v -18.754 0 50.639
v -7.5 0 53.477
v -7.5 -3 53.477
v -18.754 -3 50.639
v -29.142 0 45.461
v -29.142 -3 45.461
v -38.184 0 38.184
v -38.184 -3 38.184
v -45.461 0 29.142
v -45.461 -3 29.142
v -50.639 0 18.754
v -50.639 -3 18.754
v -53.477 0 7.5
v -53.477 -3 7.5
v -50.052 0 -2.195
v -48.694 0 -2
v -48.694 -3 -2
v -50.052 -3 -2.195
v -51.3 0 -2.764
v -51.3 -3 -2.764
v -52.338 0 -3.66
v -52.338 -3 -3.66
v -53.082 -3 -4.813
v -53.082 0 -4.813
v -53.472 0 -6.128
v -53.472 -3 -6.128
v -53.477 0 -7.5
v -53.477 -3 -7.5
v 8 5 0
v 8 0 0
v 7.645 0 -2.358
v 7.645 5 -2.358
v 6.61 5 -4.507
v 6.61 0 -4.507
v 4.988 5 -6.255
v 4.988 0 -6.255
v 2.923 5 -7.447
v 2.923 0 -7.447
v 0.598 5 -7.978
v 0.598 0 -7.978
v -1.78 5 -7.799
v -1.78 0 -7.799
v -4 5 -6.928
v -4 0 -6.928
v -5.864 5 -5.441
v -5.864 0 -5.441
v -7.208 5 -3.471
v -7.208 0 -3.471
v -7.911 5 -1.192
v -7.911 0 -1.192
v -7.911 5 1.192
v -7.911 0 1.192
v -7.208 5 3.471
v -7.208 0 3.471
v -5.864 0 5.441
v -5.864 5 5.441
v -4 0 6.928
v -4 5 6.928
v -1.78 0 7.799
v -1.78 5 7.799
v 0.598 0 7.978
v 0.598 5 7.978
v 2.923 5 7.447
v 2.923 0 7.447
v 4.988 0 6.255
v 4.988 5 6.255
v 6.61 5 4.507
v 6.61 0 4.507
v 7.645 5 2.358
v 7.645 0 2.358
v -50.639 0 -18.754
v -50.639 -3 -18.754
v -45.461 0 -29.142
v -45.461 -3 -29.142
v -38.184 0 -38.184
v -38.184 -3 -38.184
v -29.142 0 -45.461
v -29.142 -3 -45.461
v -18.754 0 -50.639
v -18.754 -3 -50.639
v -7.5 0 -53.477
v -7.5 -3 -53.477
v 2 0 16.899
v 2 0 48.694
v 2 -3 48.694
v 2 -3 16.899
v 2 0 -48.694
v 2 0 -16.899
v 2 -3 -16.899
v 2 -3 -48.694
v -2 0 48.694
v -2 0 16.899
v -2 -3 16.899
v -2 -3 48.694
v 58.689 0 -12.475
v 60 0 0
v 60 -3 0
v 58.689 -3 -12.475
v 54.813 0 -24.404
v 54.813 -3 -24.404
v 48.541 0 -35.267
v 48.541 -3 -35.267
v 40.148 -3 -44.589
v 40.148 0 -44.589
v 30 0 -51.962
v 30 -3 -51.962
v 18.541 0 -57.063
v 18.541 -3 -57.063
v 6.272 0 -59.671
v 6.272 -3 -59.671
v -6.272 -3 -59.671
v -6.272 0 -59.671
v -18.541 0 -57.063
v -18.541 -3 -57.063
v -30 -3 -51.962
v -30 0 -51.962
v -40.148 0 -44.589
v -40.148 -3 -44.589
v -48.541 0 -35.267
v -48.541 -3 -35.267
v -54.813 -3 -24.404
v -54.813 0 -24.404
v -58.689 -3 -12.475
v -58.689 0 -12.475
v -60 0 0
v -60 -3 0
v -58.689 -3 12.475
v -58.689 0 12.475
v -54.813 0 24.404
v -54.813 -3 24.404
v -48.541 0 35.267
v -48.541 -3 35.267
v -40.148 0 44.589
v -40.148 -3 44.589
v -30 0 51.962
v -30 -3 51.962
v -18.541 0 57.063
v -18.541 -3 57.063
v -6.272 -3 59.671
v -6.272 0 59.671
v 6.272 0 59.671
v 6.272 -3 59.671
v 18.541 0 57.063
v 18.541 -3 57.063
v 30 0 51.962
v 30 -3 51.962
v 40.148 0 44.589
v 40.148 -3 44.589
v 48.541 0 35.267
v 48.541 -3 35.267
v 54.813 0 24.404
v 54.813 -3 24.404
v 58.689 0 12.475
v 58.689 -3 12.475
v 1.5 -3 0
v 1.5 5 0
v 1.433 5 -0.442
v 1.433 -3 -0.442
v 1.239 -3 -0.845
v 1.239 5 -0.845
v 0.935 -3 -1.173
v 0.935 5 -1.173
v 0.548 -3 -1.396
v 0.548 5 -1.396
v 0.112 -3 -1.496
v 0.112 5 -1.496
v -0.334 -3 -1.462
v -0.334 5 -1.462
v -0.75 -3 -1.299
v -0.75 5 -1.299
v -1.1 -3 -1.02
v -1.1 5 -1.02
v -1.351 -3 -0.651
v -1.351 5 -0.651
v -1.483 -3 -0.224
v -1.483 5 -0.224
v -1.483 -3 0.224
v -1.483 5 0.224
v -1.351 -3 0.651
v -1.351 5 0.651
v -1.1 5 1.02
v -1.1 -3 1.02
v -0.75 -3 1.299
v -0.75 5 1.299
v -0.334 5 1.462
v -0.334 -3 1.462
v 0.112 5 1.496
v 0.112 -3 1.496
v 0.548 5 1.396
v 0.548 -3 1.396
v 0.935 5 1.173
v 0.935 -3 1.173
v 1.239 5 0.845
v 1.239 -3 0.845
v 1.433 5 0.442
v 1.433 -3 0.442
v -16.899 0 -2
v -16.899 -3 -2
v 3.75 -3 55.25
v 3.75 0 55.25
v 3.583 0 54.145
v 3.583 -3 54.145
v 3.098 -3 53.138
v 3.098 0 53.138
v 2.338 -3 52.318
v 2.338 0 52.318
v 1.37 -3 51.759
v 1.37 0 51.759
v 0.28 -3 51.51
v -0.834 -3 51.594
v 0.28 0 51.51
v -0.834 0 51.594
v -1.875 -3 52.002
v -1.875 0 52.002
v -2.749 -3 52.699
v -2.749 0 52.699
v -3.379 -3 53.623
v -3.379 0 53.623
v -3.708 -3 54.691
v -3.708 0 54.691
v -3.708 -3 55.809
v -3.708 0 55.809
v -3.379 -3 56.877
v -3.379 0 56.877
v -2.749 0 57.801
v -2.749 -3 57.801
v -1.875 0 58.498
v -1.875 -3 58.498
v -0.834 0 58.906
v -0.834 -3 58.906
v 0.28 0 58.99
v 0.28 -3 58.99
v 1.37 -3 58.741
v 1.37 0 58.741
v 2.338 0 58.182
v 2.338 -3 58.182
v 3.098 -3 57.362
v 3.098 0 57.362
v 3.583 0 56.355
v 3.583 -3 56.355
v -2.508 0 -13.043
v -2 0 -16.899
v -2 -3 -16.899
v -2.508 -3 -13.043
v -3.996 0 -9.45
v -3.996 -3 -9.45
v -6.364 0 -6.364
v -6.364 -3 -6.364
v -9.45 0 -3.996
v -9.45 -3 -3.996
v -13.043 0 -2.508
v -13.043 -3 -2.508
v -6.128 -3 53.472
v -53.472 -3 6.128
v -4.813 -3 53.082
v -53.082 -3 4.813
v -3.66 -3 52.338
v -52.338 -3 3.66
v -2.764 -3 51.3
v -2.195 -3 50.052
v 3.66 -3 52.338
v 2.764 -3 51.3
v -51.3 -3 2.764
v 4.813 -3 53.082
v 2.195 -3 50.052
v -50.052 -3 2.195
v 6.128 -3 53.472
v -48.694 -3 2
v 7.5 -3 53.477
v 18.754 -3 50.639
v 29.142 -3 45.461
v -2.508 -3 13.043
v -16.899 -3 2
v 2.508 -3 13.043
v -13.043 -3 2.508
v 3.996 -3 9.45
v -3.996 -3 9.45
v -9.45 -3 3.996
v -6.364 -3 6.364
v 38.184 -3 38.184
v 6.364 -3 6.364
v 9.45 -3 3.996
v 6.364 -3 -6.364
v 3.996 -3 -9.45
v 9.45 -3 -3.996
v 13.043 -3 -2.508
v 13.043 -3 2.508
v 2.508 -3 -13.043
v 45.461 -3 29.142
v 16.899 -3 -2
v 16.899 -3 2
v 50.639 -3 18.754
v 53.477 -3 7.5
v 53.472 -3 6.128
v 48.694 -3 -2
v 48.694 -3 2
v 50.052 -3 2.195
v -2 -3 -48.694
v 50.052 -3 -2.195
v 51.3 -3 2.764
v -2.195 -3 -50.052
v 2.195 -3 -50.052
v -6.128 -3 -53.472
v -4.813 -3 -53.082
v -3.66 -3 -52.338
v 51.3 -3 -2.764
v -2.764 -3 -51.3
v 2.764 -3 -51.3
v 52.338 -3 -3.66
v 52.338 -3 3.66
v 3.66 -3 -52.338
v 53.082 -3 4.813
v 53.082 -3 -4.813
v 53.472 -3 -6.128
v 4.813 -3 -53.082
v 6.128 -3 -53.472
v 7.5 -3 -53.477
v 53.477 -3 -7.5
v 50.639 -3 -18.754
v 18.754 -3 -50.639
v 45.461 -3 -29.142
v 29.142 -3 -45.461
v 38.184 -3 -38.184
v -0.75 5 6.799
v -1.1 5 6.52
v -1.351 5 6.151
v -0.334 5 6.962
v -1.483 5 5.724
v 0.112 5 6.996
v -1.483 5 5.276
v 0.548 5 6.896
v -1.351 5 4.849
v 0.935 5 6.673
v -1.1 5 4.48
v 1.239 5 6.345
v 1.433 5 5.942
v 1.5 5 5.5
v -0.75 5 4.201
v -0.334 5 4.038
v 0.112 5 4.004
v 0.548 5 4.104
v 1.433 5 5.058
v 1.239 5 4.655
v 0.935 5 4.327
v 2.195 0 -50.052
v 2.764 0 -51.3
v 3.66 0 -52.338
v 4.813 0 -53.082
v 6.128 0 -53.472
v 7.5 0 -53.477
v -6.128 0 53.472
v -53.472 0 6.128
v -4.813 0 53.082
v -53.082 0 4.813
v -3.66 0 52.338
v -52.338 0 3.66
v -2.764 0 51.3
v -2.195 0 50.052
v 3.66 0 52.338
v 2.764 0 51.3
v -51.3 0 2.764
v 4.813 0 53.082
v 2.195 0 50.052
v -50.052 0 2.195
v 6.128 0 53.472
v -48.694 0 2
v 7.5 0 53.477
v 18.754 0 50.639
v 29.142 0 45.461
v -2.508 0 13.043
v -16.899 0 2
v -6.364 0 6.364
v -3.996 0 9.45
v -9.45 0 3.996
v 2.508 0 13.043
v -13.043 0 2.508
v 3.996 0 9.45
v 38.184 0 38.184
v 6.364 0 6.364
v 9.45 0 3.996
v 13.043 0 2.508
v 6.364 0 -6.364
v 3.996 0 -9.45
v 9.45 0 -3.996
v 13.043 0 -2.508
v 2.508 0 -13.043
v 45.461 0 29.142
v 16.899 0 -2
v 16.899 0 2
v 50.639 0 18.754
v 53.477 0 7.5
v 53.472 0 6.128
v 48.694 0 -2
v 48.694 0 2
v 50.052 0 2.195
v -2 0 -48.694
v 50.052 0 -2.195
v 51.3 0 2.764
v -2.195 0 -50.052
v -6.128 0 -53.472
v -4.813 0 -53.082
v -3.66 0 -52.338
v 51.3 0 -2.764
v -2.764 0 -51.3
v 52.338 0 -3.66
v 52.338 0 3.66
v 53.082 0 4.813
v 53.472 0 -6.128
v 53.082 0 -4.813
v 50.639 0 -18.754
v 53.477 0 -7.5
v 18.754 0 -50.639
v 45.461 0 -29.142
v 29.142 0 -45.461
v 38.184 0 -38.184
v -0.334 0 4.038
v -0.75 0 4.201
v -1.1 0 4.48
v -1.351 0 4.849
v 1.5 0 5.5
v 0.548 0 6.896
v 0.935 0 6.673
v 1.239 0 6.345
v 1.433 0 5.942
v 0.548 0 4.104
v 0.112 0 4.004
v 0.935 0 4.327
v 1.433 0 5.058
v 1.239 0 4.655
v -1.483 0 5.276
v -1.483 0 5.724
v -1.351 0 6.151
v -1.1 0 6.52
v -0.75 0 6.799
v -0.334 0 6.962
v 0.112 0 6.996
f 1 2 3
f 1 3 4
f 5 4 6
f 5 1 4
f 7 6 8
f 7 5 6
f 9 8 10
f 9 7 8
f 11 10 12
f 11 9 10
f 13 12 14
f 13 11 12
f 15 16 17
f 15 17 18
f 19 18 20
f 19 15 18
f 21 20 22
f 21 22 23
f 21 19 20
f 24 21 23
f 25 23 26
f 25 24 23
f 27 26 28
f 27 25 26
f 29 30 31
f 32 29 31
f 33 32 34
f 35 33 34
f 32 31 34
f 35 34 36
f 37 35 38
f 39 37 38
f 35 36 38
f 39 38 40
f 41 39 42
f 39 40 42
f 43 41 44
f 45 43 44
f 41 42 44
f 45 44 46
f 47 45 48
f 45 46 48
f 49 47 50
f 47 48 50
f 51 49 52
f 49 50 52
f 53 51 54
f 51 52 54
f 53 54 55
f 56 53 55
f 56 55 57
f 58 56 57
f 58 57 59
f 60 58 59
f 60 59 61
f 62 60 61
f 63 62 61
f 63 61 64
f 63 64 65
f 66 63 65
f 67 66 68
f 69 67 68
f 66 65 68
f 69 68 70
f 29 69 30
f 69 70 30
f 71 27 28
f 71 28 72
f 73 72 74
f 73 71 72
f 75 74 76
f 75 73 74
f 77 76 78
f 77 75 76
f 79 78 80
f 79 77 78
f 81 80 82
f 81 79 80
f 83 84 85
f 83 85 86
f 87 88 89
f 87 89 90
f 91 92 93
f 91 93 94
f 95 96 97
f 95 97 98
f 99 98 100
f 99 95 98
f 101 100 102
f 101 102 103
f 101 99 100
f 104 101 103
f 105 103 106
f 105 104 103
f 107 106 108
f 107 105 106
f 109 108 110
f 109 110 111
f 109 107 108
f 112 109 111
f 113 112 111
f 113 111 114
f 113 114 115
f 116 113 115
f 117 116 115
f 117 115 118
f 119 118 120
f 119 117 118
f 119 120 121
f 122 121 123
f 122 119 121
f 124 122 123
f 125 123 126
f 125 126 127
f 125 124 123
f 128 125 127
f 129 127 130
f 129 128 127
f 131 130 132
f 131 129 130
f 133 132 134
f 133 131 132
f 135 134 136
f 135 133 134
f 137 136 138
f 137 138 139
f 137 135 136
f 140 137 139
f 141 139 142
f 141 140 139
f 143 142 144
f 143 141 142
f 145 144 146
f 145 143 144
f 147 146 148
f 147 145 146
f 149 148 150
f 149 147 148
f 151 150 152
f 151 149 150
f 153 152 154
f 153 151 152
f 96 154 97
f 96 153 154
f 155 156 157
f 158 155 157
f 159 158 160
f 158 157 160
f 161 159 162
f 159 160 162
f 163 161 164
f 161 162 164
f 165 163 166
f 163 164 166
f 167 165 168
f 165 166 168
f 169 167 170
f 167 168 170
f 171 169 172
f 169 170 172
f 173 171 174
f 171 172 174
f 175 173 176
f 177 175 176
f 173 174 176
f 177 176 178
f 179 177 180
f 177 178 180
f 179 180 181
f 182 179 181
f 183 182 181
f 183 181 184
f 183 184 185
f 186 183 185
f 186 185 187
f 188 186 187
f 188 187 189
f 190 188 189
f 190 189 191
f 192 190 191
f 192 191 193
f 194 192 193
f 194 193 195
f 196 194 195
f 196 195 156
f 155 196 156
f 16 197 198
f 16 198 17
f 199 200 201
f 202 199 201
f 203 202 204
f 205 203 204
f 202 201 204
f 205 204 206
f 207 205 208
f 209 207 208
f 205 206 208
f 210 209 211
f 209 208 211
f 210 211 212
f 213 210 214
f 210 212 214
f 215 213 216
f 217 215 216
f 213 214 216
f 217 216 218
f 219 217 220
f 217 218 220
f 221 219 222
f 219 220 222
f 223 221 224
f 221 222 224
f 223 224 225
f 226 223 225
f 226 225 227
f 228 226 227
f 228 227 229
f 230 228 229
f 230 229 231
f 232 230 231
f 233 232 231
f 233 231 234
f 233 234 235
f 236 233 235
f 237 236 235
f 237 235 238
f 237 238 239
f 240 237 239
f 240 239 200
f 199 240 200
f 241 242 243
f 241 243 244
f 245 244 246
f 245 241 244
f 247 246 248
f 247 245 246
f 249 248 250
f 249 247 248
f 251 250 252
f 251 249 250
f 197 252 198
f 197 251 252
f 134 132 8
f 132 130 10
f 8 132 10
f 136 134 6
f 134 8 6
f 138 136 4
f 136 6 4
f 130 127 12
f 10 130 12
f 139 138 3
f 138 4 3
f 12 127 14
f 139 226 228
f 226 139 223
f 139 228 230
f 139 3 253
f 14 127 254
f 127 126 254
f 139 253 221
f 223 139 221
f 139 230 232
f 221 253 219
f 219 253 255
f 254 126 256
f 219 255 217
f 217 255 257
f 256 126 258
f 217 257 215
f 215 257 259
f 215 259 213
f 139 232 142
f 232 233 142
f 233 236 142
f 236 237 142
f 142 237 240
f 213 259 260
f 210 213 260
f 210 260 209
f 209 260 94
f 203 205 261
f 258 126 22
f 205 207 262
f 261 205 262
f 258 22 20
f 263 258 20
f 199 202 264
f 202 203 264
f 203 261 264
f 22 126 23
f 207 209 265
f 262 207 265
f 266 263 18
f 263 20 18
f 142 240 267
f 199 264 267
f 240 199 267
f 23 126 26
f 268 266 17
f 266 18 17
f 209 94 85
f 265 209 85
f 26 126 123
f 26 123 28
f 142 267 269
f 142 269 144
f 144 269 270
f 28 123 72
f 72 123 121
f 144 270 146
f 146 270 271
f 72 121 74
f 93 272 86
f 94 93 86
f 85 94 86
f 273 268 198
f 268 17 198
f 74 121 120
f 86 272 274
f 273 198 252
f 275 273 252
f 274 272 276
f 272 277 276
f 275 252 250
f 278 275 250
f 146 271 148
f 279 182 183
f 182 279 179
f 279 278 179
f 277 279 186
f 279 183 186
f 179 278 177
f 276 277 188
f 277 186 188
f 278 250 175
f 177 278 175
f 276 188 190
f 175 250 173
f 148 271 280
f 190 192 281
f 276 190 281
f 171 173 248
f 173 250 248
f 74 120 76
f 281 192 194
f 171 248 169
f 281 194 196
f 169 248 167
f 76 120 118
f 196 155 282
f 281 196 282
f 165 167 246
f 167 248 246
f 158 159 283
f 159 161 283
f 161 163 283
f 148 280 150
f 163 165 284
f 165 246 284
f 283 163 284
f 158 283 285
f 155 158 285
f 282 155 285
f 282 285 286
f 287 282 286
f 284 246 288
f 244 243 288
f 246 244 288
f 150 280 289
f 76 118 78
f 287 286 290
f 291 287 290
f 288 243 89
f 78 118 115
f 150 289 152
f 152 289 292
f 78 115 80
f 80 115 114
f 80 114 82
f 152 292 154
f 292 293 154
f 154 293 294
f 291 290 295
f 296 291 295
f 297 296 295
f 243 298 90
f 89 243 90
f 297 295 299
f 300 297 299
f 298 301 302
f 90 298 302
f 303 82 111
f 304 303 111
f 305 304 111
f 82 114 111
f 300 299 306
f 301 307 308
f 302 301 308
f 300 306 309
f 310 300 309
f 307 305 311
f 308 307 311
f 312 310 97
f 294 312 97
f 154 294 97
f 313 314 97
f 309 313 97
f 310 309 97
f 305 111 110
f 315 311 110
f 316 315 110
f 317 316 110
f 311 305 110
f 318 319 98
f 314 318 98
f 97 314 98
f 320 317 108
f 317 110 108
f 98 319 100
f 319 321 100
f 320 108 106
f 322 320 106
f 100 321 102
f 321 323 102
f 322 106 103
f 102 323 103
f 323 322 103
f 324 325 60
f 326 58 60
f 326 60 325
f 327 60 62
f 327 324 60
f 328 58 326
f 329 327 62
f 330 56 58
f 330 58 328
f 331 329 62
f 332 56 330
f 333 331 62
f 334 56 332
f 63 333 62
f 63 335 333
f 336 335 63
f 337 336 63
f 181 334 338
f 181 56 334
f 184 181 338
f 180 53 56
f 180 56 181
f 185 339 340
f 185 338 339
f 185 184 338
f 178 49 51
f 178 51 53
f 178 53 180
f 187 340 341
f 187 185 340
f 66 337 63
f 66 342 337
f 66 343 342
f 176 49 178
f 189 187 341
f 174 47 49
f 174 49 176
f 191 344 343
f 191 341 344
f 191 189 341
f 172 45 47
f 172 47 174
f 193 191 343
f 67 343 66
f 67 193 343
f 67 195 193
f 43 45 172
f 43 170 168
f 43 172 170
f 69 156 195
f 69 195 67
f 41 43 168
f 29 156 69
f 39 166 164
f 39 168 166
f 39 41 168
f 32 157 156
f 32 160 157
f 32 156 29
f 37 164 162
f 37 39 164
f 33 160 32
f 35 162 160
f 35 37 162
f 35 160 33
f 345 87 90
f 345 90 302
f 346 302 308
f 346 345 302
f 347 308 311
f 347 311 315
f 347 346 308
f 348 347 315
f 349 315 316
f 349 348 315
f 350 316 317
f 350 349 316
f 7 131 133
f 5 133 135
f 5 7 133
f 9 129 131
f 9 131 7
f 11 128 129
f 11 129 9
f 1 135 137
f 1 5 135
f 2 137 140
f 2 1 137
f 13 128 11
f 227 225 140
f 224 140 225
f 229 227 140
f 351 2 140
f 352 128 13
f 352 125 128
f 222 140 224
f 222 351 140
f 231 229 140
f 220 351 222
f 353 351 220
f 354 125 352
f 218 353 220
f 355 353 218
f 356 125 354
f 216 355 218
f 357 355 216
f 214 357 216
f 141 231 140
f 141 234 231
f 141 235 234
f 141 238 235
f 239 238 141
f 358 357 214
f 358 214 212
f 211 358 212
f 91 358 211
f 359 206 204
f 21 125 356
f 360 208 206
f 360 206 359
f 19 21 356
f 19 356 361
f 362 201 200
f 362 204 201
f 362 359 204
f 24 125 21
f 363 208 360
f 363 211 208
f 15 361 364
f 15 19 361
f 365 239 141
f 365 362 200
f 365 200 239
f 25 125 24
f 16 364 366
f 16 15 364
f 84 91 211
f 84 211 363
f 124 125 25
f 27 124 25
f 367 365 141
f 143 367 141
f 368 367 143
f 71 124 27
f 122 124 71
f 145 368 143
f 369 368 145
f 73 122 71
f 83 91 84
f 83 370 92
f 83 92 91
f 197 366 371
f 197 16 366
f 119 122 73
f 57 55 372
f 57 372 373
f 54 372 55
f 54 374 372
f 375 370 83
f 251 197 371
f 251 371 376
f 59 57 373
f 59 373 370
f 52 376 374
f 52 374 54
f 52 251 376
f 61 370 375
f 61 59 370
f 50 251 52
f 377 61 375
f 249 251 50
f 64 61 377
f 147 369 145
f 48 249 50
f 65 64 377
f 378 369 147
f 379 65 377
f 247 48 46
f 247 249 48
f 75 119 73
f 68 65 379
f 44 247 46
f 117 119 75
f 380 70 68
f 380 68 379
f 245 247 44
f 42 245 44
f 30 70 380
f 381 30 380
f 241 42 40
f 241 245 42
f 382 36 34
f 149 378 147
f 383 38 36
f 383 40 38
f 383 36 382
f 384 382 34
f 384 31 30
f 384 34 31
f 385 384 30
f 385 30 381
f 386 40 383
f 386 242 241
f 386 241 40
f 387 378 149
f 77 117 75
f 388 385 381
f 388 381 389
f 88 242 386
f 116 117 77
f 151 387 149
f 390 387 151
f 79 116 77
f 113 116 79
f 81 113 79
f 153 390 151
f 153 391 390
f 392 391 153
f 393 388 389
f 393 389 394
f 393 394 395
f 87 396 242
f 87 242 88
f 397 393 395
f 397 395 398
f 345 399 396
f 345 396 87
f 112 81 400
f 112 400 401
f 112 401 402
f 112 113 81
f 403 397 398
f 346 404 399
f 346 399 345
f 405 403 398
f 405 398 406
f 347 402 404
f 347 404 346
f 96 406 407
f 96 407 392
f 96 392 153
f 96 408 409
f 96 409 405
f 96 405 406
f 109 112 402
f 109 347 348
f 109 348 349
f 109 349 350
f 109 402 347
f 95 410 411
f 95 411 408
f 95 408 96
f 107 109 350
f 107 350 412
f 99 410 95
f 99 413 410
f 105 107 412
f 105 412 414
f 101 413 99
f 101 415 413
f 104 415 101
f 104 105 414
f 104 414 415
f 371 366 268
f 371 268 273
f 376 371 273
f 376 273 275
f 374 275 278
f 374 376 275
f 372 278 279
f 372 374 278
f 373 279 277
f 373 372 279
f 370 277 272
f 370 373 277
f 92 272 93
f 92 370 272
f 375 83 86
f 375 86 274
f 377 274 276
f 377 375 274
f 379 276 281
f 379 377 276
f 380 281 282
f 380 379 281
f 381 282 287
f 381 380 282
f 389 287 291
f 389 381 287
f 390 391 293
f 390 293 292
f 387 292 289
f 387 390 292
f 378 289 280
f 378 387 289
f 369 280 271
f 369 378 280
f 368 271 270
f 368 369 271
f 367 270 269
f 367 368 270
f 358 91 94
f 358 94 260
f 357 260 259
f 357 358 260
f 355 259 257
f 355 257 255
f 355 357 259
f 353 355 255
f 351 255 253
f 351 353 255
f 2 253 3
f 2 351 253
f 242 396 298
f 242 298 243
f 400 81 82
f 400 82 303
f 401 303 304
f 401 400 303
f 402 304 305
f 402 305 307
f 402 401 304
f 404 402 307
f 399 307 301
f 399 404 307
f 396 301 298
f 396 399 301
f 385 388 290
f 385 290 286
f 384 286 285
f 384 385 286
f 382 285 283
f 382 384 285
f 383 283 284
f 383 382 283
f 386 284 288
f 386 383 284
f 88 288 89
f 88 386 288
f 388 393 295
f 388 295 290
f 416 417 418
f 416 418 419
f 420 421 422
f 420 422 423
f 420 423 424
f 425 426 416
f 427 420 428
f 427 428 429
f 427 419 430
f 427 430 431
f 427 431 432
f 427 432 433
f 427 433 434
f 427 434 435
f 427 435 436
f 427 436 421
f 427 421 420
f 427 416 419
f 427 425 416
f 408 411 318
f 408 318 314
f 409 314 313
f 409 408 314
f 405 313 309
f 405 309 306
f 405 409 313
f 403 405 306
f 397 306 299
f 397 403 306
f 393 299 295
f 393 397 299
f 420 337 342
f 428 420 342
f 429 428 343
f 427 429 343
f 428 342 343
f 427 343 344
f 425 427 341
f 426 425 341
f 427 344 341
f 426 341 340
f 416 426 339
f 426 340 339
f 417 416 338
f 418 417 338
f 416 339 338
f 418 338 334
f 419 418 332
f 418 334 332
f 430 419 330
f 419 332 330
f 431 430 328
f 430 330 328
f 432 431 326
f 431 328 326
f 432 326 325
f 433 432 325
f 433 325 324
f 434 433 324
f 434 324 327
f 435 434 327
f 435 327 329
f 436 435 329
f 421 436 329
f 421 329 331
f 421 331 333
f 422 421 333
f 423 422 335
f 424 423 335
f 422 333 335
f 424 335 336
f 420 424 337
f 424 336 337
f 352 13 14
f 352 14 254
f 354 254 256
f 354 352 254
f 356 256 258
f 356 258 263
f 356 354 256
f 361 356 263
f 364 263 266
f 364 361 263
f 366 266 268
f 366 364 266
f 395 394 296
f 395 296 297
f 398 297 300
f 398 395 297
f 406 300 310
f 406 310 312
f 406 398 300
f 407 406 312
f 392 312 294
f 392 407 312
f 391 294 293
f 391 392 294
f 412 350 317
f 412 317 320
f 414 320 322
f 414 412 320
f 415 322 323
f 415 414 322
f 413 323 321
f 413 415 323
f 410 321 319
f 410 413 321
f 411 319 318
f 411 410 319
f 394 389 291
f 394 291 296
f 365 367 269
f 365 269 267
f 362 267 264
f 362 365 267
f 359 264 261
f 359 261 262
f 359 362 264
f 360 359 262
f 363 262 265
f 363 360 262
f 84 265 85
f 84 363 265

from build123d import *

# Parameters (mm, degrees)
SKETCH1_R           = 60
BOSS_EXTRUDE1_DEPTH = 3
SKETCH1_3_R         = 8
BOSS_EXTRUDE2_DEPTH = 5
CUT_EXTRUDE1_REACH  = 10
SKETCH2_R           = 1.5
CUT_EXTRUDE2_REACH  = 5
SKETCH3_R           = 3.75
SKETCH4_R           = 1.5
CUT_EXTRUDE3_DEPTH  = 5


with BuildPart() as part:
    # Sketch1 → Boss-Extrude1 (new body)
    with BuildSketch(Plane(origin=(0, 0, 0), x_dir=(1, 0, 0), z_dir=(0, 1, 0))):
        Circle(SKETCH1_R)
        with BuildLine():
            ThreePointArc((7.5, -53.47663041), (3.660460389, -52.338407931), (2.000000204, -48.694167705))
            Line((2.000000204, -48.694167705), (2.000000204, -16.899494443))
            ThreePointArc((2.000000204, -16.899494443), (6.363961031, -6.363961031), (16.899494443, -2.000000204))
            Line((16.899494443, -2.000000204), (48.694167705, -2.000000204))
            ThreePointArc((48.694167705, -2.000000204), (52.338407931, -3.660460389), (53.47663041, -7.5))
            ThreePointArc((53.47663041, -7.5), (38.183766184, -38.183766184), (7.5, -53.47663041))
        make_face(mode=Mode.SUBTRACT)
        with BuildLine():
            ThreePointArc((53.47663041, 7.5), (52.338407931, 3.660460389), (48.694167705, 2.000000204))
            Line((48.694167705, 2.000000204), (16.899494443, 2.000000204))
            ThreePointArc((16.899494443, 2.000000204), (6.363961031, 6.363961031), (2.000000204, 16.899494443))
            Line((2.000000204, 16.899494443), (2.000000204, 48.694167705))
            ThreePointArc((2.000000204, 48.694167705), (3.660460389, 52.338407931), (7.5, 53.47663041))
            ThreePointArc((7.5, 53.47663041), (38.183766184, 38.183766184), (53.47663041, 7.5))
        make_face(mode=Mode.SUBTRACT)
        with BuildLine():
            ThreePointArc((-7.5, 53.47663041), (-3.660460389, 52.338407931), (-2.000000204, 48.694167705))
            Line((-2.000000204, 48.694167705), (-2.000000204, 16.899494443))
            ThreePointArc((-2.000000204, 16.899494443), (-6.363961031, 6.363961031), (-16.899494443, 2.000000204))
            Line((-16.899494443, 2.000000204), (-48.694167705, 2.000000204))
            ThreePointArc((-48.694167705, 2.000000204), (-52.338407931, 3.660460389), (-53.47663041, 7.5))
            ThreePointArc((-53.47663041, 7.5), (-38.183766184, 38.183766184), (-7.5, 53.47663041))
        make_face(mode=Mode.SUBTRACT)
        with BuildLine():
            ThreePointArc((-53.47663041, -7.5), (-52.338407931, -3.660460389), (-48.694167705, -2.000000204))
            Line((-48.694167705, -2.000000204), (-16.899494443, -2.000000204))
            ThreePointArc((-16.899494443, -2.000000204), (-6.363961031, -6.363961031), (-2.000000204, -16.899494443))
            Line((-2.000000204, -16.899494443), (-2.000000204, -48.694167705))
            ThreePointArc((-2.000000204, -48.694167705), (-3.660460389, -52.338407931), (-7.5, -53.47663041))
            ThreePointArc((-7.5, -53.47663041), (-38.183766184, -38.183766184), (-53.47663041, -7.5))
        make_face(mode=Mode.SUBTRACT)
    extrude(amount=-BOSS_EXTRUDE1_DEPTH)

    # Sketch1<3> → Boss-Extrude2 (add)
    with BuildSketch(Plane(origin=(0, 0, 0), x_dir=(1, 0, 0), z_dir=(0, 1, 0))):
        Circle(SKETCH1_3_R)
    extrude(amount=BOSS_EXTRUDE2_DEPTH)

    # Sketch2 → Cut-Extrude1 (cut, up to next)
    with BuildSketch(Plane(origin=(0, 5, 0), x_dir=(1, 0, 0), z_dir=(0, 1, 0)), mode=Mode.PRIVATE) as cut_extrude1_sk1:
        Circle(SKETCH2_R)
    cut_extrude1_tool1 = extrude(cut_extrude1_sk1.sketch, amount=-CUT_EXTRUDE1_REACH, mode=Mode.PRIVATE) & part.part
    add(cut_extrude1_tool1.solids().sort_by_distance((0, 5, 0))[0], mode=Mode.SUBTRACT)

    # Sketch3 → Cut-Extrude2 (cut, up to next)
    with BuildSketch(Plane(origin=(0, 0, 0), x_dir=(1, 0, 0), z_dir=(0, 1, 0)), mode=Mode.PRIVATE) as cut_extrude2_sk1:
        with Locations((0, -55.25)):
            Circle(SKETCH3_R)
    cut_extrude2_tool1 = extrude(cut_extrude2_sk1.sketch, amount=-CUT_EXTRUDE2_REACH, mode=Mode.PRIVATE) & part.part
    add(cut_extrude2_tool1.solids().sort_by_distance((0, 0, 55.25))[0], mode=Mode.SUBTRACT)

    # Sketch4 → Cut-Extrude3 (cut)
    with BuildSketch(Plane(origin=(0, 5, 0), x_dir=(1, 0, 0), z_dir=(0, 1, 0))):
        with Locations((0, -5.5)):
            Circle(SKETCH4_R)
    extrude(amount=-CUT_EXTRUDE3_DEPTH, mode=Mode.SUBTRACT)


solid = part.part
